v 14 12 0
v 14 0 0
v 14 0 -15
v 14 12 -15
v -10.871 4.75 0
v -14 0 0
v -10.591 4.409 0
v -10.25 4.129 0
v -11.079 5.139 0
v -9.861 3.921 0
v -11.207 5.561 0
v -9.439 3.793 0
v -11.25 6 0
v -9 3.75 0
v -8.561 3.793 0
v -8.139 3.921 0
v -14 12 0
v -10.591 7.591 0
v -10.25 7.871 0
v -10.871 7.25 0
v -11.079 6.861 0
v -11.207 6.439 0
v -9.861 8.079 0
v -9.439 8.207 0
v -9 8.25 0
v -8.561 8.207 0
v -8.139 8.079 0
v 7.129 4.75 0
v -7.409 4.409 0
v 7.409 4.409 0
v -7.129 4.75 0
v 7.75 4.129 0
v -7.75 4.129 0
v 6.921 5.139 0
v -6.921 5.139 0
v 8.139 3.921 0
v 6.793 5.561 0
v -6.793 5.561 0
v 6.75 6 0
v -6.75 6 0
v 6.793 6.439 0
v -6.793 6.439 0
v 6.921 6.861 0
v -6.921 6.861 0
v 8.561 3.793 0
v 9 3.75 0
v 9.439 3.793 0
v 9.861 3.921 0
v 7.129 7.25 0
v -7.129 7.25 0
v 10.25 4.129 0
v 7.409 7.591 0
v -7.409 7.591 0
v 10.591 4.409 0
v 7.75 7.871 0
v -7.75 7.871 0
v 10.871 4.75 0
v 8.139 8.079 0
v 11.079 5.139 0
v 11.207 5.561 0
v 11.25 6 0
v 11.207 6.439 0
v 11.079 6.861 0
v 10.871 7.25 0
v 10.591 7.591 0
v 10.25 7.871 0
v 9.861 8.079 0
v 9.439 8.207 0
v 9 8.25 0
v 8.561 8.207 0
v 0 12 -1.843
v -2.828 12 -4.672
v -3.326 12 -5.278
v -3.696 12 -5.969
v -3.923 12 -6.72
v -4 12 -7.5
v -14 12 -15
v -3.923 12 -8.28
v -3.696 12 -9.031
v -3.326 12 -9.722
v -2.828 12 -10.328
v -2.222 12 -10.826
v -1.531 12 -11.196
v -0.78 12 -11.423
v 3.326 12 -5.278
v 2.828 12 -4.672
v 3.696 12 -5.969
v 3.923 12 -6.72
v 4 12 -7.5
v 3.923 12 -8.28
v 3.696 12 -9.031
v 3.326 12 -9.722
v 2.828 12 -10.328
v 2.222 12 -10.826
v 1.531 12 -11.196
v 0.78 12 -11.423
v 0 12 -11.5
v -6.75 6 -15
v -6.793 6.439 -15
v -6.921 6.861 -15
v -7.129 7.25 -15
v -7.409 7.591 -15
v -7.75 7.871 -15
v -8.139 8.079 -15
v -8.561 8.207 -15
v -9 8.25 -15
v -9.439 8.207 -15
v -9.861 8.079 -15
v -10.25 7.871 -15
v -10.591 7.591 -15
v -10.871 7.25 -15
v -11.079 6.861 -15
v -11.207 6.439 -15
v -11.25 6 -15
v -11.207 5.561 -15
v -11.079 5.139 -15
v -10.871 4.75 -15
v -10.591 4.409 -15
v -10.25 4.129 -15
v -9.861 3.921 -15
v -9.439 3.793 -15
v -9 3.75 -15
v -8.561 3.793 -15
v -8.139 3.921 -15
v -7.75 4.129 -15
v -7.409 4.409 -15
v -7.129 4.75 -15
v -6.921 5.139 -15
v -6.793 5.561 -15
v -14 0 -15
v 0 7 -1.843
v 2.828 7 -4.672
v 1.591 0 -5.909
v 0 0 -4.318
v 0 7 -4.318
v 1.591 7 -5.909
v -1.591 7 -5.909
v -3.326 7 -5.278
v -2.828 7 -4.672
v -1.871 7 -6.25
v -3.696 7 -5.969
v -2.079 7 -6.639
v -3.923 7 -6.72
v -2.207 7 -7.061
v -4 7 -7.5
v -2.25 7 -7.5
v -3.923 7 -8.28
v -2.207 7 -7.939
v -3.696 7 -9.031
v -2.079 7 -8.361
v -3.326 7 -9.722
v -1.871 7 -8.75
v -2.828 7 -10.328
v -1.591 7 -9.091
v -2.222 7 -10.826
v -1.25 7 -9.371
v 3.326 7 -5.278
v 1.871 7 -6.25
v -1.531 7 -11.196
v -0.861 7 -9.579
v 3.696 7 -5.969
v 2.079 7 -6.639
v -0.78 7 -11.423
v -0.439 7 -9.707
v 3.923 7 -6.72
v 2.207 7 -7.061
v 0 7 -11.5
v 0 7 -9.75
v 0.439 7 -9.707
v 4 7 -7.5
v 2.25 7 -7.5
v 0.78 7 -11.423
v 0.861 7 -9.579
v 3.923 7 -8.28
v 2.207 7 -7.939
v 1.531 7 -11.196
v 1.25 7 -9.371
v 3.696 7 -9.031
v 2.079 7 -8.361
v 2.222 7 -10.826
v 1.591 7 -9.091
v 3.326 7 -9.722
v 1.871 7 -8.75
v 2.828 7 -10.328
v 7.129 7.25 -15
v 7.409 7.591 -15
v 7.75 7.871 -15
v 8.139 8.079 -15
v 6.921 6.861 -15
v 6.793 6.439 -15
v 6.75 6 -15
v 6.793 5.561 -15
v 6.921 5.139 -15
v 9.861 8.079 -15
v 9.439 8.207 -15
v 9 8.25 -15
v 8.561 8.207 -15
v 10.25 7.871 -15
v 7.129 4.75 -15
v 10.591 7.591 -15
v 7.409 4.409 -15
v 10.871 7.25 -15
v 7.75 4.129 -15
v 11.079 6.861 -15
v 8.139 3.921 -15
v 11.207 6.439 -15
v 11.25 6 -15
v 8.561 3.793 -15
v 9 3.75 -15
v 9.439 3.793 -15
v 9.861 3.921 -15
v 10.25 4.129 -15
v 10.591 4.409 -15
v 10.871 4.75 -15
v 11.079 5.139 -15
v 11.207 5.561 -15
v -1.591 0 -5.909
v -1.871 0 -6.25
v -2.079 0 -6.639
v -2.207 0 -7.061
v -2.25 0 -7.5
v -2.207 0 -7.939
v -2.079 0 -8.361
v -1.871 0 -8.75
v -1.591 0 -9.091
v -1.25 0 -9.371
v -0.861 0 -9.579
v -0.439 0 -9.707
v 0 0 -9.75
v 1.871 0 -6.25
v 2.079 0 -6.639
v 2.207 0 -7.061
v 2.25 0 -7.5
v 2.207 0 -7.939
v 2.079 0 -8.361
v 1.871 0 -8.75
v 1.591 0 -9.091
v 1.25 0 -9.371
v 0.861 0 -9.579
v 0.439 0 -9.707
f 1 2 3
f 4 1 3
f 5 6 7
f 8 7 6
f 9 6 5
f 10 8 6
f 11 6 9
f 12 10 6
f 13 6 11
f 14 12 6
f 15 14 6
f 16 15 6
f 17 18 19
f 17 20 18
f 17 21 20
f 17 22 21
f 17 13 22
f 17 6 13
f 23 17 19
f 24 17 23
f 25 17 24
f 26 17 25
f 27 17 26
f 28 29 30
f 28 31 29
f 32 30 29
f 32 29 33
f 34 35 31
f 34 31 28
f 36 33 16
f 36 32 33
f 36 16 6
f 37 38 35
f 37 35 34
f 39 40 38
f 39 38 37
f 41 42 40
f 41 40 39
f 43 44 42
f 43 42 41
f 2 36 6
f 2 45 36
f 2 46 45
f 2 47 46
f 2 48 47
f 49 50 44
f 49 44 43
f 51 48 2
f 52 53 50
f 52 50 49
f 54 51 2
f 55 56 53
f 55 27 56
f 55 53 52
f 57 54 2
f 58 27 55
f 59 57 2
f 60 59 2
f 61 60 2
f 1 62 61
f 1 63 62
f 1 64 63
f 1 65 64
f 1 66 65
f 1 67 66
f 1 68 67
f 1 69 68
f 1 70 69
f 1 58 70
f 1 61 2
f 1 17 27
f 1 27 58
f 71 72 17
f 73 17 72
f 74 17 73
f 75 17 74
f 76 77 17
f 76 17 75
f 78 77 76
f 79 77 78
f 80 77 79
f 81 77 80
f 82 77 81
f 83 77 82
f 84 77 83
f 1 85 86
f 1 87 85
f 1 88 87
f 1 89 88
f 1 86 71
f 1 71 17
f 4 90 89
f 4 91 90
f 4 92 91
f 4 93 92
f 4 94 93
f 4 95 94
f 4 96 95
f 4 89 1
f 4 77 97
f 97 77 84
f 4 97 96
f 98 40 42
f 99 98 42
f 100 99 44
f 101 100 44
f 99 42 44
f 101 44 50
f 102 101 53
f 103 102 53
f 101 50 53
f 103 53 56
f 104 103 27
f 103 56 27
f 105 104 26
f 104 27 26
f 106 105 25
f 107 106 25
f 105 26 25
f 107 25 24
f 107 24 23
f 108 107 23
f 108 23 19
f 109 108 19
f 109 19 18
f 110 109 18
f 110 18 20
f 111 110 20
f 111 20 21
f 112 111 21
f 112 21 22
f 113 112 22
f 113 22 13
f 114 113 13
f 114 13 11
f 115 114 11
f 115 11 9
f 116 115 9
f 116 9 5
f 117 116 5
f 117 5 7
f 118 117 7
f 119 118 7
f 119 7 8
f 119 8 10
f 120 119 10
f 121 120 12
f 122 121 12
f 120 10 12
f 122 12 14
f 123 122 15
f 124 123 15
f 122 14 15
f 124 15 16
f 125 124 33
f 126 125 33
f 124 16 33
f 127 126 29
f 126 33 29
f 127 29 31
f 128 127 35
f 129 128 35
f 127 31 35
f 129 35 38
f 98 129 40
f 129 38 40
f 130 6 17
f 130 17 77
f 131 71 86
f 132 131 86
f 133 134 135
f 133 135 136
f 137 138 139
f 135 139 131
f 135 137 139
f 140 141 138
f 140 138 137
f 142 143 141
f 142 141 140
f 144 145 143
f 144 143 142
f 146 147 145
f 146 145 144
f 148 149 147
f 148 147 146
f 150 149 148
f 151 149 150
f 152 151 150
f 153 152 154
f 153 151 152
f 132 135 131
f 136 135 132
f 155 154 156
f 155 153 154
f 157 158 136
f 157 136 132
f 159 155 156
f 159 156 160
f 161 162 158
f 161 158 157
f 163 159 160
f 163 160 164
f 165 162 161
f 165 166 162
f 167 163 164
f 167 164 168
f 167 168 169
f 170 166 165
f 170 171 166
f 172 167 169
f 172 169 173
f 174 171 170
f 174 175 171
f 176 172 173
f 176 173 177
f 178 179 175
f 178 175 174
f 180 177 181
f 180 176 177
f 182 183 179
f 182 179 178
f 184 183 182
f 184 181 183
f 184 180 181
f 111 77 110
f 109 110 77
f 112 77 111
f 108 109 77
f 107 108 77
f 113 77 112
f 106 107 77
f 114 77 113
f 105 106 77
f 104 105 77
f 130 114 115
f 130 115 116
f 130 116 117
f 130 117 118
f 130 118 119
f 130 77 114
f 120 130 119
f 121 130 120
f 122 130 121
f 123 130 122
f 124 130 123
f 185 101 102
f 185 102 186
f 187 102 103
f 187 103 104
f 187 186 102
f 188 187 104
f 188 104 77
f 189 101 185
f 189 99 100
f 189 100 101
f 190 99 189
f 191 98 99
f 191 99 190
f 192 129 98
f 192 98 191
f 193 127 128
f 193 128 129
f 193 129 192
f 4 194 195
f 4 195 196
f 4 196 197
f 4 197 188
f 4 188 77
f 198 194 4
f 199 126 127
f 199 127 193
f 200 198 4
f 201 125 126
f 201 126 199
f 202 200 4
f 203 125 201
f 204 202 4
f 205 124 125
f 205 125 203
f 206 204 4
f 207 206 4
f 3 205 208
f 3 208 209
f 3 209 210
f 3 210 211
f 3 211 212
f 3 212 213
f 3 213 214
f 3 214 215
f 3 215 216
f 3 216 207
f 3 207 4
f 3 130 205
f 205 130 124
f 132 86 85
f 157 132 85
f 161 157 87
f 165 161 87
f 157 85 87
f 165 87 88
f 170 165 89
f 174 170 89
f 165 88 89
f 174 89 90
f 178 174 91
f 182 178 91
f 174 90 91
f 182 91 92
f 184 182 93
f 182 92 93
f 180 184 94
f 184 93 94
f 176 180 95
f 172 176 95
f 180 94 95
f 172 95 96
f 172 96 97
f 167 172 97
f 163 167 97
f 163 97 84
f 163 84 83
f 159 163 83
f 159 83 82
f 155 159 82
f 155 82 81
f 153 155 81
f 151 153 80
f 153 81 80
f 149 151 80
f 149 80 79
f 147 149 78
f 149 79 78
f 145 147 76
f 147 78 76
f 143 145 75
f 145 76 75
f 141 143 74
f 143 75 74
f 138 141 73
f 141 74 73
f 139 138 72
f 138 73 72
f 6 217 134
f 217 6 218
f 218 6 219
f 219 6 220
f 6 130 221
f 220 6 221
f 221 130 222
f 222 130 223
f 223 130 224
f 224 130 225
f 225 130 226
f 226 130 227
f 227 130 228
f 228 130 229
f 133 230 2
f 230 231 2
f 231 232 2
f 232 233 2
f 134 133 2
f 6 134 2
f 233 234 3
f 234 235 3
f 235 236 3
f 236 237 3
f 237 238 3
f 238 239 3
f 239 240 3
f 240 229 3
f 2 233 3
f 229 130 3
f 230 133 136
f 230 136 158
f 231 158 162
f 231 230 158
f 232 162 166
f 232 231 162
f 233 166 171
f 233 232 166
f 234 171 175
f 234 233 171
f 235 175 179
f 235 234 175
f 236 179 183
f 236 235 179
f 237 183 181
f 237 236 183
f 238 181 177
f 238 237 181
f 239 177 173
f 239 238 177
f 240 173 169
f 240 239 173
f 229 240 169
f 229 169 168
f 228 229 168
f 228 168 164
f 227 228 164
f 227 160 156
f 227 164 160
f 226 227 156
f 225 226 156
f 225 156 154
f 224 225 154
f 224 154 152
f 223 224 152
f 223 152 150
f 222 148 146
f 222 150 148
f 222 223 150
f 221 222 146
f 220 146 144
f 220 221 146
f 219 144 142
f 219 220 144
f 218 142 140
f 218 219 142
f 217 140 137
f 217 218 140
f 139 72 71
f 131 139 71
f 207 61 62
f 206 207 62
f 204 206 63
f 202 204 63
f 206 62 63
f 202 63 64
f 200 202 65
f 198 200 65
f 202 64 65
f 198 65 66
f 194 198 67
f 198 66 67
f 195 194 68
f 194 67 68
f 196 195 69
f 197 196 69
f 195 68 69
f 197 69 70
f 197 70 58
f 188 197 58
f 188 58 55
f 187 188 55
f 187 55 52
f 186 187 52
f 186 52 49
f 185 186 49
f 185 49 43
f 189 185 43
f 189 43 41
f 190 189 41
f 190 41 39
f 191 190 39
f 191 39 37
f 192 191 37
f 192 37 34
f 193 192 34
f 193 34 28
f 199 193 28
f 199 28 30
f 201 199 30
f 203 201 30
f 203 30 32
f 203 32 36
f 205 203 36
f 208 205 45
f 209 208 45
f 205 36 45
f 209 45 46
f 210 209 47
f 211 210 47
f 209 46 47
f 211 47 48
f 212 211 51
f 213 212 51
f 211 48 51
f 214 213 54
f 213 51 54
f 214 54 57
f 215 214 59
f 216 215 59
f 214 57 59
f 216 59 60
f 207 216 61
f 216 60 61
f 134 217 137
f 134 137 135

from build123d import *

# Parameters (mm, degrees)
SKETCH1_W           = 28
SKETCH1_H           = 30
BOSS_EXTRUDE1_DEPTH = 12
SKETCH2_R           = 2.25
CUT_EXTRUDE1_DEPTH  = 36.213633723
SKETCH4_W           = 28
SKETCH4_H           = 15
CUT_EXTRUDE3_DEPTH  = 24.769728648
CUT_EXTRUDE4_DEPTH  = 5


with BuildPart() as part:
    # Sketch1 → Boss-Extrude1 (new body)
    with BuildSketch(Plane(origin=(0, 0, 0), x_dir=(1, 0, 0), z_dir=(0, 1, 0))):
        Rectangle(SKETCH1_W, SKETCH1_H)
        with BuildLine():
            Line((-1.590990258, -9.090990258), (0, -10.681980515))
            Line((0, -10.681980515), (1.590990258, -9.090990258))
            ThreePointArc((1.590990258, -9.090990258), (0, -5.25), (-1.590990258, -9.090990258))
        make_face(mode=Mode.SUBTRACT)
        with BuildLine():
            Line((-1.590990258, 5.909009742), (0, 4.318019485))
            Line((0, 4.318019485), (1.590990258, 5.909009742))
            ThreePointArc((1.590990258, 5.909009742), (0, 9.75), (-1.590990258, 5.909009742))
        make_face(mode=Mode.SUBTRACT)
    extrude(amount=BOSS_EXTRUDE1_DEPTH)

    # Sketch2 → Cut-Extrude1 (cut, through all)
    with BuildSketch(Plane.XY.offset(15)):
        with Locations((-9, 6)):
            Circle(SKETCH2_R)
        with Locations((9, 6)):
            Circle(SKETCH2_R)
    extrude(amount=-CUT_EXTRUDE1_DEPTH, mode=Mode.SUBTRACT)

    # Sketch4 → Cut-Extrude3 (cut, through all)
    with BuildSketch(Plane(origin=(0, 12, 0), x_dir=(1, 0, 0), z_dir=(0, 1, 0))):
        with Locations((0, -7.5)):
            Rectangle(SKETCH4_W, SKETCH4_H)
    extrude(amount=-CUT_EXTRUDE3_DEPTH, mode=Mode.SUBTRACT)

    # Sketch5 → Cut-Extrude4 (cut)
    with BuildSketch(Plane(origin=(0, 12, 0), x_dir=(1, 0, 0), z_dir=(0, 1, 0))):
        with BuildLine():
            Line((-2.828427125, 4.671572875), (0, 1.843145751))
            Line((0, 1.843145751), (2.828427125, 4.671572875))
            ThreePointArc((2.828427125, 4.671572875), (0, 11.5), (-2.828427125, 4.671572875))
        make_face()
    extrude(amount=-CUT_EXTRUDE4_DEPTH, mode=Mode.SUBTRACT)


solid = part.part
